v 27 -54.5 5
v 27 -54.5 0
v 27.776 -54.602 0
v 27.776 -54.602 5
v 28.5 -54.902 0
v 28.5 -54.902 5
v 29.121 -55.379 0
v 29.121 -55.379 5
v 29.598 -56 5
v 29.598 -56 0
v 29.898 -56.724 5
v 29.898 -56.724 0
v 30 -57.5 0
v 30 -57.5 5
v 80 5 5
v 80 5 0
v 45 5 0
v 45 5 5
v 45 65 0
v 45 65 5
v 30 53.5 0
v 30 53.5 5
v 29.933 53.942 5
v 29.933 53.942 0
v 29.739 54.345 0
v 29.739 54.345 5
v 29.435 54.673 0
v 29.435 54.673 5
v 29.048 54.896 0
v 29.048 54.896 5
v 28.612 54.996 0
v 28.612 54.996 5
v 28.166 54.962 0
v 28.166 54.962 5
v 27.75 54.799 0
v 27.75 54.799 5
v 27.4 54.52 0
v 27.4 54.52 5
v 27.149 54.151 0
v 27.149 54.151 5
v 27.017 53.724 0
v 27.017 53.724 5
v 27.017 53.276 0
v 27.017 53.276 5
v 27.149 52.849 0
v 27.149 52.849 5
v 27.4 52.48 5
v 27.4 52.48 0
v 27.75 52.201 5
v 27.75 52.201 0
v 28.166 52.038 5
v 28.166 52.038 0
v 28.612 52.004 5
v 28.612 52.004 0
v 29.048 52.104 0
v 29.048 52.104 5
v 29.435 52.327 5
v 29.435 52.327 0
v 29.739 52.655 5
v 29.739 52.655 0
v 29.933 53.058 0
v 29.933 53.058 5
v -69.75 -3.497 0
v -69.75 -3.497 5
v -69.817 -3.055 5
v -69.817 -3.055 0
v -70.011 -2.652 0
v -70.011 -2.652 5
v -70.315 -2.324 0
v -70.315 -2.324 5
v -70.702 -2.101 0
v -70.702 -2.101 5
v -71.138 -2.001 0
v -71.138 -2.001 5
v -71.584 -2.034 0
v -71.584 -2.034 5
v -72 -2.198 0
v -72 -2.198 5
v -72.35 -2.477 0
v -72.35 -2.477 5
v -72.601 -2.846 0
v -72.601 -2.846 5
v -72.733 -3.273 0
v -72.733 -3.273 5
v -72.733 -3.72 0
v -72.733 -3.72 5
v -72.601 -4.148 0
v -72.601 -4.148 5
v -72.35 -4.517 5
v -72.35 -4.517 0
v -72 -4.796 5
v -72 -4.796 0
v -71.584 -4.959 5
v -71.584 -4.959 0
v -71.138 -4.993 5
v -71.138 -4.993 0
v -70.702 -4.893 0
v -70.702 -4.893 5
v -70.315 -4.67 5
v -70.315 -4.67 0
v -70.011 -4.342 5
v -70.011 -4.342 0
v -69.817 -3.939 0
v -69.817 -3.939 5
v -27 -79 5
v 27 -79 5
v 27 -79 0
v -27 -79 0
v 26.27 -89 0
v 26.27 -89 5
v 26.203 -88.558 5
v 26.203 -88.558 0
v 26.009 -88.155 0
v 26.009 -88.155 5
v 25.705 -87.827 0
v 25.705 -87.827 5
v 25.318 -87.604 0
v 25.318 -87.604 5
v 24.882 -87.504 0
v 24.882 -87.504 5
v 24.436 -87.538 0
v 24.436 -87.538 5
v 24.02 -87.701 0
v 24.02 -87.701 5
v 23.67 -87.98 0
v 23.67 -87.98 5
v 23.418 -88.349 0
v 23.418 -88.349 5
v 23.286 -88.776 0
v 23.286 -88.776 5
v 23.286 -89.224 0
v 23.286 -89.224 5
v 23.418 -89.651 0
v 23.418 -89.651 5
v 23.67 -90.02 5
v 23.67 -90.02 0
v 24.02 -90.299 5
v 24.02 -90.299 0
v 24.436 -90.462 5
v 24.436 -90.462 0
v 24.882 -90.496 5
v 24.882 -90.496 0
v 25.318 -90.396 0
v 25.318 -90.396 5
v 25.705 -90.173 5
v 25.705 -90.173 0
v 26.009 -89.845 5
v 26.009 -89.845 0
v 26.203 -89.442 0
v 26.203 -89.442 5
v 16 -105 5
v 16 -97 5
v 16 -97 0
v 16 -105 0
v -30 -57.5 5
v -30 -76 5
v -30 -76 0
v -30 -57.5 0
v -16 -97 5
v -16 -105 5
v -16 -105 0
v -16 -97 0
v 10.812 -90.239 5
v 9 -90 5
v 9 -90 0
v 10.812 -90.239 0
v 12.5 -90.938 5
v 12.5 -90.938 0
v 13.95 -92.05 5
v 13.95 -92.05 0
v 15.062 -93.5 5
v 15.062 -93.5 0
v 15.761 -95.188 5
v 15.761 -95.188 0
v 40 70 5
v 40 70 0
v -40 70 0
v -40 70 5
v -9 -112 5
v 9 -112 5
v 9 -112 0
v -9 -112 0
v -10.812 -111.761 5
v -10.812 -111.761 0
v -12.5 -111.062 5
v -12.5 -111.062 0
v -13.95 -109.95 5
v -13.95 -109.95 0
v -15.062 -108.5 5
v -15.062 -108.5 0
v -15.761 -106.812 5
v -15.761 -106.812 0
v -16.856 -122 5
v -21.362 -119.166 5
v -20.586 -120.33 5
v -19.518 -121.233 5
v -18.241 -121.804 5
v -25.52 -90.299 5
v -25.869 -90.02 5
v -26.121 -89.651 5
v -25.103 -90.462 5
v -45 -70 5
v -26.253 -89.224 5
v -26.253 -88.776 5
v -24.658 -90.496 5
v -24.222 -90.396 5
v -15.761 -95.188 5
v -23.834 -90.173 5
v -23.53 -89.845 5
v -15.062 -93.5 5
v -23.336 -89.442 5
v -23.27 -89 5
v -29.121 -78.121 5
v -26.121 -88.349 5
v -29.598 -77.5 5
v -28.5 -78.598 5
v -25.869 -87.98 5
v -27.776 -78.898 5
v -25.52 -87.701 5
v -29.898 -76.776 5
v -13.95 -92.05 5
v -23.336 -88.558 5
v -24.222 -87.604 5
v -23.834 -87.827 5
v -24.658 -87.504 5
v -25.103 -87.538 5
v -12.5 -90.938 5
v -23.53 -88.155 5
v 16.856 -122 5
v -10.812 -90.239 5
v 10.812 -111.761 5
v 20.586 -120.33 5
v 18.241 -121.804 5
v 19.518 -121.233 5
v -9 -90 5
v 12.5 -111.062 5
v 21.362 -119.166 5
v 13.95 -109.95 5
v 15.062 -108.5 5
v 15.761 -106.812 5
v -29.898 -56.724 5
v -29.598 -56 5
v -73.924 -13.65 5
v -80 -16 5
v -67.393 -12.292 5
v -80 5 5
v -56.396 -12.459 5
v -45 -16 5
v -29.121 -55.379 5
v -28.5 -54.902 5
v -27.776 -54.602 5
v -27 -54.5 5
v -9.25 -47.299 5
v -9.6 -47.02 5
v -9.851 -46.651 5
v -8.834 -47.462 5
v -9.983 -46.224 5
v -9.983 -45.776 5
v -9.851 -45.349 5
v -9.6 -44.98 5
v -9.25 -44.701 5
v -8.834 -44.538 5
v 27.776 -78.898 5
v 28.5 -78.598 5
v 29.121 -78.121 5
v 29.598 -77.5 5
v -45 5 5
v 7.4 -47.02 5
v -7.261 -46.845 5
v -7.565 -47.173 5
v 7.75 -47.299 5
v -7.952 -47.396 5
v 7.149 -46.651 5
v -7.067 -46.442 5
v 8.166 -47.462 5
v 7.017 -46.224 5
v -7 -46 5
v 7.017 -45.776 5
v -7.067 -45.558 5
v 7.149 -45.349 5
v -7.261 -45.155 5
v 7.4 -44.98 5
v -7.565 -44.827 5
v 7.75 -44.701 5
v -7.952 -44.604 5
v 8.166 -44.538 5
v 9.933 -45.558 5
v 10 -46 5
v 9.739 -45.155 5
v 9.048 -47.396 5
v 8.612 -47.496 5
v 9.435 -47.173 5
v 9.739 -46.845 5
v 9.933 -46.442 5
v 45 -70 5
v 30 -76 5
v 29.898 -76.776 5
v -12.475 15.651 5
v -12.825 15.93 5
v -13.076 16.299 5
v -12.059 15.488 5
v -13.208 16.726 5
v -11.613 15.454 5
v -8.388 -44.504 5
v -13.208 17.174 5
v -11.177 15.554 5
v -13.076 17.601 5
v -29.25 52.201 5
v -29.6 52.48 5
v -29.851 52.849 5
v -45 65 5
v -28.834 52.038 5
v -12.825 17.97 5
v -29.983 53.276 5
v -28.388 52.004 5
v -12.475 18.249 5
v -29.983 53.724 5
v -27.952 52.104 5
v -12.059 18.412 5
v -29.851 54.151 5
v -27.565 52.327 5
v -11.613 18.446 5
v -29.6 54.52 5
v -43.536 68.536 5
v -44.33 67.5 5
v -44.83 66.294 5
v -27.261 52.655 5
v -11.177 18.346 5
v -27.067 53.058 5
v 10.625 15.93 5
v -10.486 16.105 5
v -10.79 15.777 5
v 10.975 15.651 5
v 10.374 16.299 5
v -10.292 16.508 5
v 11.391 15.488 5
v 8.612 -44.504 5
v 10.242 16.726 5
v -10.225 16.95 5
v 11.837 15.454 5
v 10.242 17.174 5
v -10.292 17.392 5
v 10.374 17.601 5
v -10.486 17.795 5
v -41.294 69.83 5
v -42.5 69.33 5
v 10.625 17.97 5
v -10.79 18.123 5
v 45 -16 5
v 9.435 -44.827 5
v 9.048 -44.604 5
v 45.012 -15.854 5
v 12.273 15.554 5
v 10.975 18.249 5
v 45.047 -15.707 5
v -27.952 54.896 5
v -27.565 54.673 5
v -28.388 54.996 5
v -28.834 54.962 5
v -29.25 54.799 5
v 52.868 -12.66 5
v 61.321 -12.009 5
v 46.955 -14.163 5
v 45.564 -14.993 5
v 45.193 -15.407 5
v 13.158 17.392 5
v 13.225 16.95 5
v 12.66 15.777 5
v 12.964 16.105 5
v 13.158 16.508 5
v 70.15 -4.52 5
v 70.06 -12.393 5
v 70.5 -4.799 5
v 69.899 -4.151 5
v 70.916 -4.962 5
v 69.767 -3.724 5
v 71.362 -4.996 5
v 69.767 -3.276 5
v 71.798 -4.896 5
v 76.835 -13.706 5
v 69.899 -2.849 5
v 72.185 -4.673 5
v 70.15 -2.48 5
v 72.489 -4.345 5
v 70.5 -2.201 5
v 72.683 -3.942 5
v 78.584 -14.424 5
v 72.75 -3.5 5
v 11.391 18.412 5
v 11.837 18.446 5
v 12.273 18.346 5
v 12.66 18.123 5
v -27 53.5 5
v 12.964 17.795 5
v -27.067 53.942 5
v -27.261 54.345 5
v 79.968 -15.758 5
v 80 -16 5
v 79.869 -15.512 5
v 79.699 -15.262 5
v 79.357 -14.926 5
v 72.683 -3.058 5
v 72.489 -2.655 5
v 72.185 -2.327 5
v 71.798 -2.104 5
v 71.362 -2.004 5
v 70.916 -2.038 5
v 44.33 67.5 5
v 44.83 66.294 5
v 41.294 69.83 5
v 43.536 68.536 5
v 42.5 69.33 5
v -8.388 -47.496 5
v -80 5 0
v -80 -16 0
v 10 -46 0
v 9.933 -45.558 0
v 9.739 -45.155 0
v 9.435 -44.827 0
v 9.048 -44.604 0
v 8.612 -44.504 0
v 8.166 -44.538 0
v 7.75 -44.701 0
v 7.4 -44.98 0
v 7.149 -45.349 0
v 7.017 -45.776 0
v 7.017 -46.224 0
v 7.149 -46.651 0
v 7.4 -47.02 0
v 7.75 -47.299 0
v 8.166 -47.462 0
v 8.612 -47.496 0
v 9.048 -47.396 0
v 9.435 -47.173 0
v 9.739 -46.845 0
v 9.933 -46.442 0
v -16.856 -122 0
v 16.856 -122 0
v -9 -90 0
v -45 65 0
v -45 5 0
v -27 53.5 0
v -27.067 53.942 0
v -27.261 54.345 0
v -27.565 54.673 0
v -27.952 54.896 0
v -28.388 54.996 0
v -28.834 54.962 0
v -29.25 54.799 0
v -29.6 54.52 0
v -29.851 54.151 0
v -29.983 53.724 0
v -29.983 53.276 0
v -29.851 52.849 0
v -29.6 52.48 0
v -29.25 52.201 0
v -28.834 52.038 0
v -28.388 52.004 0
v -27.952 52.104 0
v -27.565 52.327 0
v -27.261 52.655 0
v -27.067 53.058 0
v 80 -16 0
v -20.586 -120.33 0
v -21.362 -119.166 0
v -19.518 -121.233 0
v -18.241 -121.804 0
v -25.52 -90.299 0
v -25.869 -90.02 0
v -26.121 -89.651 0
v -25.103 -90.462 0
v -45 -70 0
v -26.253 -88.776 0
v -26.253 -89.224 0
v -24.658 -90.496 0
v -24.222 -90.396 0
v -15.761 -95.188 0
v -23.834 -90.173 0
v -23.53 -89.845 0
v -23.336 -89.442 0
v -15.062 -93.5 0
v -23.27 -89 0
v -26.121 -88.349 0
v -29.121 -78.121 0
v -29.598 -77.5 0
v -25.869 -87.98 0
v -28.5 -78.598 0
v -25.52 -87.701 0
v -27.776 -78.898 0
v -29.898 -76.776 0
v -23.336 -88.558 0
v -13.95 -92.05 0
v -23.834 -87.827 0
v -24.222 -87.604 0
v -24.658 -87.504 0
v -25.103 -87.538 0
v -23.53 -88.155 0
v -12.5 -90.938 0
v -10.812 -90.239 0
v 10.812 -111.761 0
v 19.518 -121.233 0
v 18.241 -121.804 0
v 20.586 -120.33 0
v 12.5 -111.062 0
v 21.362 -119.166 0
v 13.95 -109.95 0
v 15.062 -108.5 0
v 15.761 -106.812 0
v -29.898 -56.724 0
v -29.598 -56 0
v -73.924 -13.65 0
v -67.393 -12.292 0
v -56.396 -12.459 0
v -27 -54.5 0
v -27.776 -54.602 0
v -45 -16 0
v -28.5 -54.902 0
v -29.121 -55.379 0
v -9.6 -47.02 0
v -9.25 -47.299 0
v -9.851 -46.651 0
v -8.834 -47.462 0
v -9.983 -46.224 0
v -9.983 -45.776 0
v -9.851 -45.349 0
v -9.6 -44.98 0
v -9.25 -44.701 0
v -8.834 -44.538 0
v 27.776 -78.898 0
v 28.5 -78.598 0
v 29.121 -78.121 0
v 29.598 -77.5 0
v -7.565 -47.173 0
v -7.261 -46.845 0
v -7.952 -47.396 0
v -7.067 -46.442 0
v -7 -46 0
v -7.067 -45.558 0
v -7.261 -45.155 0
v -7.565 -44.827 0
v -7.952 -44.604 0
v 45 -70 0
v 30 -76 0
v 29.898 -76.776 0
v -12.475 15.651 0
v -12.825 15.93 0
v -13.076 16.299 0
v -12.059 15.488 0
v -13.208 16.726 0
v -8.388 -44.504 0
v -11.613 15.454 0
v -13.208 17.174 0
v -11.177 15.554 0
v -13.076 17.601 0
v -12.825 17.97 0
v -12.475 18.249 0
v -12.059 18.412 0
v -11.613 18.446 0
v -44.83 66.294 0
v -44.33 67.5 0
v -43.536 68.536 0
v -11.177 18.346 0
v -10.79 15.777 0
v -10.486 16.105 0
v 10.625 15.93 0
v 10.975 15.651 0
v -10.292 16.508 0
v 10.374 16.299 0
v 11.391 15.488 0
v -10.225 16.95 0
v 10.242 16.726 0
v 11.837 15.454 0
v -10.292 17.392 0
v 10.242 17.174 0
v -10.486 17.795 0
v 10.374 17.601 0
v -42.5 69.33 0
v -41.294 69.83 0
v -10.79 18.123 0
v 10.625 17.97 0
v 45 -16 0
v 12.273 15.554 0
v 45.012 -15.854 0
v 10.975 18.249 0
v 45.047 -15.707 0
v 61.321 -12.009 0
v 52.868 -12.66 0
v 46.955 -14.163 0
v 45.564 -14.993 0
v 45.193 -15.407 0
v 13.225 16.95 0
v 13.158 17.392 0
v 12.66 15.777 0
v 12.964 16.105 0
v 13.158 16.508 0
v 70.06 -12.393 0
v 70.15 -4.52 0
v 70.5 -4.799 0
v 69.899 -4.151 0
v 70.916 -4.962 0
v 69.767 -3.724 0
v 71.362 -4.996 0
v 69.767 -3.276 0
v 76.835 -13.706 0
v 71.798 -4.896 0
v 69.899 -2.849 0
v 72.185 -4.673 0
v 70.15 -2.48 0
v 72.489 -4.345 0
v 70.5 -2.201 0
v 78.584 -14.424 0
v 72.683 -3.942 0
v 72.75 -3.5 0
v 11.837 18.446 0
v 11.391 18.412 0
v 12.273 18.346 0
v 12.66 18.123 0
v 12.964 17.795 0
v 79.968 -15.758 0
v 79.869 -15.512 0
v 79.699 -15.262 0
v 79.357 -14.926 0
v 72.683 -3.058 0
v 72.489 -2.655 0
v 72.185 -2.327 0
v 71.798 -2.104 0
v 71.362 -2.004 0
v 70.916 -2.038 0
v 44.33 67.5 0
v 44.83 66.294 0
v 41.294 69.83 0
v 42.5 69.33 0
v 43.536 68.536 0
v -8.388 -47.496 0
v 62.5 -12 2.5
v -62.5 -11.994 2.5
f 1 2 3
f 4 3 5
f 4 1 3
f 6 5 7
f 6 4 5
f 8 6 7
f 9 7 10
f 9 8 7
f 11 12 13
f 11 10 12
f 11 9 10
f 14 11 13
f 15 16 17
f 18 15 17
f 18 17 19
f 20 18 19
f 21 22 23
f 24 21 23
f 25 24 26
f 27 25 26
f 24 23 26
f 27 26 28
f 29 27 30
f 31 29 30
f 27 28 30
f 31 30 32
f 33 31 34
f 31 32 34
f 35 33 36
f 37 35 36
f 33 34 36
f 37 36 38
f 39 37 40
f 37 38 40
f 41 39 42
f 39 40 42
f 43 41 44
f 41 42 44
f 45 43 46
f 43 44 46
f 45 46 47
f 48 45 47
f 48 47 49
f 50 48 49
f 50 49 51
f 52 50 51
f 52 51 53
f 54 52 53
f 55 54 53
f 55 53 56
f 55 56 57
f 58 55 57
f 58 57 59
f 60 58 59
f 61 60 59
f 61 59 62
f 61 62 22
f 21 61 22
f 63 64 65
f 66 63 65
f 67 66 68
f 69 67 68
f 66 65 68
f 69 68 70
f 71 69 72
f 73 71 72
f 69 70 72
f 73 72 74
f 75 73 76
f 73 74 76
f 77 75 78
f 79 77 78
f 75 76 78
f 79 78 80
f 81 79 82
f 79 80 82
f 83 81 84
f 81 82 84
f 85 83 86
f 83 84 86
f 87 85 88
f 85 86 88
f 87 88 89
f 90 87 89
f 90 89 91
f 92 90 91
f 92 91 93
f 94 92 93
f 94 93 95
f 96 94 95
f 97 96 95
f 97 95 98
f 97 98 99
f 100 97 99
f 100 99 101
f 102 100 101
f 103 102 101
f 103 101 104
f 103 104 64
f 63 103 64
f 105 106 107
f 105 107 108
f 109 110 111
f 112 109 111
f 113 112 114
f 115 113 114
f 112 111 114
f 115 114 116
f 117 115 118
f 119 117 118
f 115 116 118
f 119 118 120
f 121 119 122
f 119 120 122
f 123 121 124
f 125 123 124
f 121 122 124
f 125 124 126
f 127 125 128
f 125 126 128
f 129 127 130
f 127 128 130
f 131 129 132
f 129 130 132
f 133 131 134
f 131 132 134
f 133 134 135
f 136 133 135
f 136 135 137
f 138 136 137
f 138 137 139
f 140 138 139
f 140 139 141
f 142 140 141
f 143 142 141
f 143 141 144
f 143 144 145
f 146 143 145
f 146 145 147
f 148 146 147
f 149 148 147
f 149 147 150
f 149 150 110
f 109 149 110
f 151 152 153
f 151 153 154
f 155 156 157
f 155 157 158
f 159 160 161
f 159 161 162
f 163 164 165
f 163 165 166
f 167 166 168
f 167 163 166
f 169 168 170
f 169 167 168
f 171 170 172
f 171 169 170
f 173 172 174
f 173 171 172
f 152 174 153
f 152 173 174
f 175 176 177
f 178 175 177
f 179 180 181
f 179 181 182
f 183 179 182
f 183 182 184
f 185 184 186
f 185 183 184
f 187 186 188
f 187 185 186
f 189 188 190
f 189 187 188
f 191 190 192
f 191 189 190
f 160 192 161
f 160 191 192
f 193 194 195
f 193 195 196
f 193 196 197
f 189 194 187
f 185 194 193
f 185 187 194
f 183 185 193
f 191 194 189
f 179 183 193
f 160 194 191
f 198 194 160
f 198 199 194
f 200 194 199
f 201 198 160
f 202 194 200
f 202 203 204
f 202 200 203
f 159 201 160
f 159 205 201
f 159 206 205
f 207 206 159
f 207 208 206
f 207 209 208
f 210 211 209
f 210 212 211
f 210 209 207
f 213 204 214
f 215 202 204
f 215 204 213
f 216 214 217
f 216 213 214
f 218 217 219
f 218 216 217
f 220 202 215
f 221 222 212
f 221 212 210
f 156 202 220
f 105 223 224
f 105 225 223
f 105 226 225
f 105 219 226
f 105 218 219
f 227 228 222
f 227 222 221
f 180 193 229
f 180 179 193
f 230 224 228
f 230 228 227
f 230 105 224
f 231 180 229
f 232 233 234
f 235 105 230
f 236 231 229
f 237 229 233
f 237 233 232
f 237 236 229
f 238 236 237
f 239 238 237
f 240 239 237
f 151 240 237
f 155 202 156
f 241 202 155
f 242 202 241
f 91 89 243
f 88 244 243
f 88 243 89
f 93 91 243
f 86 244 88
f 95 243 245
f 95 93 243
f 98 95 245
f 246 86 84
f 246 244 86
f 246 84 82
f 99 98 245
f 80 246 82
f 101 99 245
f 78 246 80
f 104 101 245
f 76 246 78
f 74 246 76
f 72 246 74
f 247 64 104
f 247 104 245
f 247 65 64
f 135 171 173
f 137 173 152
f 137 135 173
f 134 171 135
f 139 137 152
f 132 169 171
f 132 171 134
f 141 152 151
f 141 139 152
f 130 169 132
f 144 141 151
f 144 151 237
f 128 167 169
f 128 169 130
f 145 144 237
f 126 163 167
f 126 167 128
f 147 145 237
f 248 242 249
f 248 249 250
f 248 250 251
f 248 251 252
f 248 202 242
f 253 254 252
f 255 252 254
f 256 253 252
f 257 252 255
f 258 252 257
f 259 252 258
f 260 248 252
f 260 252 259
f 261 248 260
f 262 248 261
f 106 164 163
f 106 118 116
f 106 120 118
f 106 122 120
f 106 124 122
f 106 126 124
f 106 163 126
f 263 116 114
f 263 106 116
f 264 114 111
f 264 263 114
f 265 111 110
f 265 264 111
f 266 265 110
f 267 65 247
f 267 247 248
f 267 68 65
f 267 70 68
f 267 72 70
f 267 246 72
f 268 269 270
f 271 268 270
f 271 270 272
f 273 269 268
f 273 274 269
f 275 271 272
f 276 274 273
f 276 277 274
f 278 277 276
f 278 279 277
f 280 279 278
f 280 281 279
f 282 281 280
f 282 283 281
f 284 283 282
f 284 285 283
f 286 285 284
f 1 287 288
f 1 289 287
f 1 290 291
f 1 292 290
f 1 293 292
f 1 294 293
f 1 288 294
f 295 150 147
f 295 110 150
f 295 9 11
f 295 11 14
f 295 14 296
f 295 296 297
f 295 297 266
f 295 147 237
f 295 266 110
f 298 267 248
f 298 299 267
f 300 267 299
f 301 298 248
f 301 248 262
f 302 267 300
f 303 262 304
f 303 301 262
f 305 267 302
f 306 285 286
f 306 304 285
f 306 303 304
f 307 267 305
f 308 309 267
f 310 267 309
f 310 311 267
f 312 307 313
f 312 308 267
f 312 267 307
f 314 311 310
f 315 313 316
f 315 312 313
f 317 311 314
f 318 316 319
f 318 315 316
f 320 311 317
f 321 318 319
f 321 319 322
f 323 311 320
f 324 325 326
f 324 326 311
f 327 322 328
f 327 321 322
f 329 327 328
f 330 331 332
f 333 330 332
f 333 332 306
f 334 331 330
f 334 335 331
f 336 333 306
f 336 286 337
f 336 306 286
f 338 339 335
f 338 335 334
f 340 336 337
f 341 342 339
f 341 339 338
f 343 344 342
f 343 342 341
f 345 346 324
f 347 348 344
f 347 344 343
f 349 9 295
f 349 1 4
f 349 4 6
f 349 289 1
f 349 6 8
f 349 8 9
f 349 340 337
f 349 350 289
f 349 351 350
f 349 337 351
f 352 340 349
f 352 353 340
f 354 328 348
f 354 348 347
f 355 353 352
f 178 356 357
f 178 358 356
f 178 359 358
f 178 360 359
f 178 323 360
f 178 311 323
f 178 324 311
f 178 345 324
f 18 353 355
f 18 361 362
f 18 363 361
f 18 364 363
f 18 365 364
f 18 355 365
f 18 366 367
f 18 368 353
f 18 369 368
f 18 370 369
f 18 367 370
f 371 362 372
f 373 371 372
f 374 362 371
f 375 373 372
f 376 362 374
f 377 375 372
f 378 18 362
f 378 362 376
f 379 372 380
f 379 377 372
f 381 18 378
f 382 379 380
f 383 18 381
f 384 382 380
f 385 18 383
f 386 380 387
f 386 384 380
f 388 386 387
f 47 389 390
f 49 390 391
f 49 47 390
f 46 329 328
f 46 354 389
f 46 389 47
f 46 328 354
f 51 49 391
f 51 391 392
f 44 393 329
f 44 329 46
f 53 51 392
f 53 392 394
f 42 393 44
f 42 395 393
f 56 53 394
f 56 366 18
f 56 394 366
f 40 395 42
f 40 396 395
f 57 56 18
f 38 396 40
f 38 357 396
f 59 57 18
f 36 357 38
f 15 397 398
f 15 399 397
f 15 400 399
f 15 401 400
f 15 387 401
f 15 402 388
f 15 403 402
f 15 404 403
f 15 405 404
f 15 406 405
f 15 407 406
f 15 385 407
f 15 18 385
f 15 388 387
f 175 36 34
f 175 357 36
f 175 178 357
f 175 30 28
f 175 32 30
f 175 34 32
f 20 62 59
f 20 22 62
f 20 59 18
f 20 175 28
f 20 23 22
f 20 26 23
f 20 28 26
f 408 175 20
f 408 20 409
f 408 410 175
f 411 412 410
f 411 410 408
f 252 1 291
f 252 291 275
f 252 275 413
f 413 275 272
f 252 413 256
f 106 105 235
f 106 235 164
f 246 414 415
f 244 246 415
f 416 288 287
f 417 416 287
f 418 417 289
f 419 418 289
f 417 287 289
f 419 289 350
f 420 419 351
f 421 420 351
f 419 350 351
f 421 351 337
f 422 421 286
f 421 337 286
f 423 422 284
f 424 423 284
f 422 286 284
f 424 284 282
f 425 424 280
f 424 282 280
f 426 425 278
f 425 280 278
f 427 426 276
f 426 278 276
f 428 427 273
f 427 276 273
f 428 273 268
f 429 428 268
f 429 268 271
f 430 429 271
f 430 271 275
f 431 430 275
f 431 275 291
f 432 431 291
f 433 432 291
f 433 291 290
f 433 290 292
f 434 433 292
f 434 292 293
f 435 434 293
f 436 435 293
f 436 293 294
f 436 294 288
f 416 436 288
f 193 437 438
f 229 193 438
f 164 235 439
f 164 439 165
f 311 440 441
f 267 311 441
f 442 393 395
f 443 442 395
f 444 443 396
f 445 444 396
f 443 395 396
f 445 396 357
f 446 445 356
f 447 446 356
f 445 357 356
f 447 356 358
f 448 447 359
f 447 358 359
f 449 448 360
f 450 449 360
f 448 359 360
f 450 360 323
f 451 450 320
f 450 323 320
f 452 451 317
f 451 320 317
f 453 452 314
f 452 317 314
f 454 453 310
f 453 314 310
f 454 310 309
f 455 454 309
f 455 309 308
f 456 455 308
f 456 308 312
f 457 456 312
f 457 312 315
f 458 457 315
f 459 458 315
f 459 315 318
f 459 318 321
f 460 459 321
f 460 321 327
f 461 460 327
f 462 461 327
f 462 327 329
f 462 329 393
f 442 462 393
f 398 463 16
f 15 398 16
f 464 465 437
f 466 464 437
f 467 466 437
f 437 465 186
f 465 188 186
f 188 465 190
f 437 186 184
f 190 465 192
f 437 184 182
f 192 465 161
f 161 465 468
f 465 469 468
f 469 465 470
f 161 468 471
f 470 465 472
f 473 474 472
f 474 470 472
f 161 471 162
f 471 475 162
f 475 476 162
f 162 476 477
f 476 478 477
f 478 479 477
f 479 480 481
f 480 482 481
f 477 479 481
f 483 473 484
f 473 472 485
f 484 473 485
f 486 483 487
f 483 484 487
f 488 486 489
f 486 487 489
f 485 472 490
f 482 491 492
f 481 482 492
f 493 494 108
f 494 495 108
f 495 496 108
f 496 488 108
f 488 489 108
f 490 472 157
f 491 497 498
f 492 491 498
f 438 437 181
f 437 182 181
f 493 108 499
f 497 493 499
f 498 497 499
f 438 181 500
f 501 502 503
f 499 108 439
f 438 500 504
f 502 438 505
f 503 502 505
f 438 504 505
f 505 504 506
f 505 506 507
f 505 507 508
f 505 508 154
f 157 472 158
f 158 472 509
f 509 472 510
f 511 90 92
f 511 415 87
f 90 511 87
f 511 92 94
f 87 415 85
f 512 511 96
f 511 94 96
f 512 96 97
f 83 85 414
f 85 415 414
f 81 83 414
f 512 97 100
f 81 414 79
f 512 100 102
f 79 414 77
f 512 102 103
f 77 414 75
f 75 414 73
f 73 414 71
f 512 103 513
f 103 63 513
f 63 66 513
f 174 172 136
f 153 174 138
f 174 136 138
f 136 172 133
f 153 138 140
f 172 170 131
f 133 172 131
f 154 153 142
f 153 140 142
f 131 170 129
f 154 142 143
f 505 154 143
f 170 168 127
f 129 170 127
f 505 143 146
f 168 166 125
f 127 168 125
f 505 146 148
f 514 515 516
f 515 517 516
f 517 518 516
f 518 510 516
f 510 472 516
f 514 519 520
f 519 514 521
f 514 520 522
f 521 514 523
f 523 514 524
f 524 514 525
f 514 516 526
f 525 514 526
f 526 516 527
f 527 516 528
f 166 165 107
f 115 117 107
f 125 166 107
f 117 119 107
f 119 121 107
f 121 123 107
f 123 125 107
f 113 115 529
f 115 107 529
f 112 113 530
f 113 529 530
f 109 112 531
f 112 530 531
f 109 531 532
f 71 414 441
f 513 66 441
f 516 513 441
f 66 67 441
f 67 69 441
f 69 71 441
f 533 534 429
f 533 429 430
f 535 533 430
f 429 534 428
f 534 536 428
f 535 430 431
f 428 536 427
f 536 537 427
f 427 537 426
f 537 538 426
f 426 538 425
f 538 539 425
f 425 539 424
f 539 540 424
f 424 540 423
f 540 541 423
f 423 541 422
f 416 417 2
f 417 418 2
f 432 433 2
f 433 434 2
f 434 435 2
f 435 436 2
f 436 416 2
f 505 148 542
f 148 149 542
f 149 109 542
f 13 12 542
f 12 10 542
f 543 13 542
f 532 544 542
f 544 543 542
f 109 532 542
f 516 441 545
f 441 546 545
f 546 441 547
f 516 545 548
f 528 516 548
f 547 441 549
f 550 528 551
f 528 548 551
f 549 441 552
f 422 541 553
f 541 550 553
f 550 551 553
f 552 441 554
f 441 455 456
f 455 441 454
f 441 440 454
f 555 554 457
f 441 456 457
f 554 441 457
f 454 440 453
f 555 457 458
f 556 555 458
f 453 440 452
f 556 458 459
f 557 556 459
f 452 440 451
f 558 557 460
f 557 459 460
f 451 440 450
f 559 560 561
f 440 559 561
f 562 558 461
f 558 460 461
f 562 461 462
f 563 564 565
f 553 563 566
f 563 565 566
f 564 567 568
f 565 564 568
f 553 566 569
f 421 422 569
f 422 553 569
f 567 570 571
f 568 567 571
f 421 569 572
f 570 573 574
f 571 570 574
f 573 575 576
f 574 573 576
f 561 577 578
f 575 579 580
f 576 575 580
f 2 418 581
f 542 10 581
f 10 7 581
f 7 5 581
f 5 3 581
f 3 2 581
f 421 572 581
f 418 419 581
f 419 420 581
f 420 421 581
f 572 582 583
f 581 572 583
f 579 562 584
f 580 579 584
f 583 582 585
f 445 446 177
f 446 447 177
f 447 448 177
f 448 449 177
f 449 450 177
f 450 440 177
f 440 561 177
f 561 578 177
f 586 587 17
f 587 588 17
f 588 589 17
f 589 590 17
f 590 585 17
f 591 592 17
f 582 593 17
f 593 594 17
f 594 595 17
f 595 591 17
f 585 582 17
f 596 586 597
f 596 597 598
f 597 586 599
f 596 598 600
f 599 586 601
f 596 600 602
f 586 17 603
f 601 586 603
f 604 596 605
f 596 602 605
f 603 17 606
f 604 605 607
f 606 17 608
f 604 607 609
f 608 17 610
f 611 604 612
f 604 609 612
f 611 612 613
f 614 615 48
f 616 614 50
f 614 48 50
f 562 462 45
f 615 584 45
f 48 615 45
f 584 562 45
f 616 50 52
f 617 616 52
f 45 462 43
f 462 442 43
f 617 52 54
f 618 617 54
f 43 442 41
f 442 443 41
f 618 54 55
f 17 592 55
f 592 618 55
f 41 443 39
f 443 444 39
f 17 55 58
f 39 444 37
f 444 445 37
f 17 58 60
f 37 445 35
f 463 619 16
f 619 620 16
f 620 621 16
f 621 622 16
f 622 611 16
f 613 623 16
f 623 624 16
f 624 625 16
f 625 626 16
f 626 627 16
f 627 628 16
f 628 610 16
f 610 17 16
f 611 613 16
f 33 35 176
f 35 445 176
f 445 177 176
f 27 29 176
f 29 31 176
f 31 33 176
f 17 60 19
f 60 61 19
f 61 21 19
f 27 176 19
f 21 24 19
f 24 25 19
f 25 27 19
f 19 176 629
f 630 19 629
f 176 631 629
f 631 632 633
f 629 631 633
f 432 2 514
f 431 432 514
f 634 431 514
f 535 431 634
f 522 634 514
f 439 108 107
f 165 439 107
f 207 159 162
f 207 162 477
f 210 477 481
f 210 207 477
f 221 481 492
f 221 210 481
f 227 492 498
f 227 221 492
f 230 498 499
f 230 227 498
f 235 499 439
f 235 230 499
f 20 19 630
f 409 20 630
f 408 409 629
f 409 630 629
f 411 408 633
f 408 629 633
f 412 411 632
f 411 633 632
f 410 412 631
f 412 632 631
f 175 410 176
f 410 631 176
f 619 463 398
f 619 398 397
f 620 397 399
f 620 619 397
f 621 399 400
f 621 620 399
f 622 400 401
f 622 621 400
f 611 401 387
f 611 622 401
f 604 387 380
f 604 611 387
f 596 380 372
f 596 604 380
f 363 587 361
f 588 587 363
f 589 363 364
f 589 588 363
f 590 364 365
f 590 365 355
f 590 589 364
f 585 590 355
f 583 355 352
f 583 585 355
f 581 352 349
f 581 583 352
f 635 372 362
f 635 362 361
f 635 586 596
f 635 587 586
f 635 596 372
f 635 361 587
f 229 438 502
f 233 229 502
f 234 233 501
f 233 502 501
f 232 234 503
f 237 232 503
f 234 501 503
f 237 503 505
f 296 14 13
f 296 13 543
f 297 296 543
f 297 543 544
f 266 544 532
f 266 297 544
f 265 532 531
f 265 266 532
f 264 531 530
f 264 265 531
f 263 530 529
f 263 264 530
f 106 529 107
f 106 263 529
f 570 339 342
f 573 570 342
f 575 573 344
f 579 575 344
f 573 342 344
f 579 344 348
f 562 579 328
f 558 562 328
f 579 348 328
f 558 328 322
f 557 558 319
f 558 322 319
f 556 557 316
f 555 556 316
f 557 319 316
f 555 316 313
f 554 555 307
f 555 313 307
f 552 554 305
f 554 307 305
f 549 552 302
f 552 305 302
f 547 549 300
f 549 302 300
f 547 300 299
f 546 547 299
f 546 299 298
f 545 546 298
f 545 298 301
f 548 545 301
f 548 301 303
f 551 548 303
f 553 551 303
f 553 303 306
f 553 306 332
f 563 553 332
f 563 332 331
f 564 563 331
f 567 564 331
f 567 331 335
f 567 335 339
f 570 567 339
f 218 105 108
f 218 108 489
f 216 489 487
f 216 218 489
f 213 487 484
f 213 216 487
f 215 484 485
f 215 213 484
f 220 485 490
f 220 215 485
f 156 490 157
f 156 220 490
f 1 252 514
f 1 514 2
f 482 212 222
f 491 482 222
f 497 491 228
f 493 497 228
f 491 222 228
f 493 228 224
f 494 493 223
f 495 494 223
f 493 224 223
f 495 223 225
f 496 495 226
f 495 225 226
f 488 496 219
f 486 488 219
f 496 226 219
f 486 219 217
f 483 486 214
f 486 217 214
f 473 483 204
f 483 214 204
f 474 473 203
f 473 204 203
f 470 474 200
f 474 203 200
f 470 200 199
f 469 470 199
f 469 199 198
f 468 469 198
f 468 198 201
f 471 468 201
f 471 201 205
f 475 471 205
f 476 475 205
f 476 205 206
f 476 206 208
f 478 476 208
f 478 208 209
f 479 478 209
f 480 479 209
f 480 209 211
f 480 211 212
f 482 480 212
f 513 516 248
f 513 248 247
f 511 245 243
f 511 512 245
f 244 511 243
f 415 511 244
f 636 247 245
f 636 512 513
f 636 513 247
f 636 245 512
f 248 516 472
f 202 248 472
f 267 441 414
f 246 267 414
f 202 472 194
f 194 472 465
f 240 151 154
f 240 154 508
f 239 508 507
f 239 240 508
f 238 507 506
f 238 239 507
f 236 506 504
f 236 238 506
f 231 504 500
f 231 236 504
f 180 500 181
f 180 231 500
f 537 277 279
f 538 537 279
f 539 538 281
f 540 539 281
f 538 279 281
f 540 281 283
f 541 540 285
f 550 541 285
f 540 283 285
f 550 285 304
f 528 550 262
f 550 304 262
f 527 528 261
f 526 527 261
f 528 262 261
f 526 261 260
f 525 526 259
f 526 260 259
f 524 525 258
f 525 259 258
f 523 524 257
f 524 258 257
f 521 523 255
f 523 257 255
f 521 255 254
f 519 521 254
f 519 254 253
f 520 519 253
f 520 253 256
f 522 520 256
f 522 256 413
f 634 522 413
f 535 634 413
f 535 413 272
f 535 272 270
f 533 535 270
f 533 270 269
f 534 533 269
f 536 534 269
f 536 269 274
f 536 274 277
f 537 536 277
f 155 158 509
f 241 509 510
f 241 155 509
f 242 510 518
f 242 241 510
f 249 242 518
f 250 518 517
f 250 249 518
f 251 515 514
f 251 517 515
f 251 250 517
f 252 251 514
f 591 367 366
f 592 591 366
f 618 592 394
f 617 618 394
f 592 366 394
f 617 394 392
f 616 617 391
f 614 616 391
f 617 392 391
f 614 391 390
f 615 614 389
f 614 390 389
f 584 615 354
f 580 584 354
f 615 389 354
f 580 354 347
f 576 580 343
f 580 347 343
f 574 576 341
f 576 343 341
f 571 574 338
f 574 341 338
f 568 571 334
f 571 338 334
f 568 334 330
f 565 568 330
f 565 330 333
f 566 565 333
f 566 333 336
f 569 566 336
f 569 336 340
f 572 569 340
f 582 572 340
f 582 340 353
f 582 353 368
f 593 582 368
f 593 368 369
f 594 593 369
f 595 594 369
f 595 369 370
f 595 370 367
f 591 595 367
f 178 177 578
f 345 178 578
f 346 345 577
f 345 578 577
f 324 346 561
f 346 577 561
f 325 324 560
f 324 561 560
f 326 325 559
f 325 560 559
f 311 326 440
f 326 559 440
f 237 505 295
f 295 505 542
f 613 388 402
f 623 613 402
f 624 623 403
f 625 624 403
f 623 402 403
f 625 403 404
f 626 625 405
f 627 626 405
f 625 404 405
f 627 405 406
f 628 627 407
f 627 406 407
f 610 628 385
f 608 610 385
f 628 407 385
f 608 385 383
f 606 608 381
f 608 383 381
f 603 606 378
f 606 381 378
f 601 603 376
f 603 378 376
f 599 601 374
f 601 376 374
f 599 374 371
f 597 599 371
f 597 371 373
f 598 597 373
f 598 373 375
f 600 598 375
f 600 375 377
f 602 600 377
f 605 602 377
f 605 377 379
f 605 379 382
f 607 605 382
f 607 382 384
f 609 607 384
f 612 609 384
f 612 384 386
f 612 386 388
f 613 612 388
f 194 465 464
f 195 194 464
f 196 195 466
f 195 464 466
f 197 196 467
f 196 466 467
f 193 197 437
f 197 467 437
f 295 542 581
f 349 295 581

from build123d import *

# Parameters (mm, degrees)
BOSS_EXTRUDE1_DEPTH = 5
SKETCH3_R           = 1.5
CUT_EXTRUDE1_DEPTH  = 146.976025571
CUT_EXTRUDE2_DEPTH  = 146.976025571
SKETCH5_R           = 1.5
CUT_EXTRUDE3_DEPTH  = 146.976025571
CUT_EXTRUDE4_DEPTH  = 146.976025571
SKETCH7_R           = 1.5
CUT_EXTRUDE5_DEPTH  = 146.976025571


with BuildPart() as part:
    # Sketch2 → Boss-Extrude1 (new body)
    with BuildSketch(Plane.XY):
        with BuildLine():
            Line((-45, -70), (-21.362272993, -119.166472174))
            ThreePointArc((-21.362272993, -119.166472174), (-19.517555453, -121.23275093), (-16.85601087, -122))
            Line((-16.85601087, -122), (16.85601087, -122))
            ThreePointArc((16.85601087, -122), (19.517555453, -121.23275093), (21.362272993, -119.166472174))
            Line((21.362272993, -119.166472174), (45, -70))
            Line((45, -70), (45, -16))
            add(Edge.make_bspline(
                [(80, -16), (80, -12), (62.5, -12), (45, -12), (45, -16)],
                knots=[3.141592654, 3.141592654, 3.141592654, 4.71238898, 4.71238898, 6.283185307, 6.283185307, 6.283185307], degree=2, weights=[1, 0.707106781, 1, 0.707106781, 1]))
            Line((80, -16), (80, 5))
            Line((80, 5), (45, 5))
            Line((45, 5), (45, 65))
            ThreePointArc((45, 65), (43.535533906, 68.535533906), (40, 70))
            Line((40, 70), (-40, 70))
            ThreePointArc((-40, 70), (-43.535533906, 68.535533906), (-45, 65))
            Line((-45, 65), (-45, 5))
            Line((-45, 5), (-80, 5))
            Line((-80, 5), (-80, -16))
            add(Edge.make_bspline(
                [(-45, -16), (-62.5, -7.544335015), (-80, -16)],
                knots=[3.141592654, 3.141592654, 3.141592654, 4.041796627, 4.041796627, 4.041796627], degree=2, weights=[1, 0.900402737, 1]))
            Line((-45, -16), (-45, -70))
        make_face()
    extrude(amount=BOSS_EXTRUDE1_DEPTH)

    # Sketch3 → Cut-Extrude1 (cut, through all)
    with BuildSketch(Plane.XY.offset(5)):
        with Locations((-71.25, -3.49687094)):
            Circle(SKETCH3_R)
        with Locations((71.25, -3.5)):
            Circle(SKETCH3_R)
    extrude(amount=-CUT_EXTRUDE1_DEPTH, mode=Mode.SUBTRACT)

    # Sketch4 → Cut-Extrude2 (cut, through all)
    with BuildSketch(Plane.XY.offset(5)):
        with BuildLine():
            Line((-9, -90), (9, -90))
            ThreePointArc((9, -90), (13.949747468, -92.050252532), (16, -97))
            Line((16, -97), (16, -105))
            ThreePointArc((16, -105), (13.949747468, -109.949747468), (9, -112))
            Line((9, -112), (-9, -112))
            ThreePointArc((-9, -112), (-13.949747468, -109.949747468), (-16, -105))
            Line((-16, -105), (-16, -97))
            ThreePointArc((-16, -97), (-13.949747468, -92.050252532), (-9, -90))
        make_face()
    extrude(amount=-CUT_EXTRUDE2_DEPTH, mode=Mode.SUBTRACT)

    # Sketch5 → Cut-Extrude3 (cut, through all)
    with BuildSketch(Plane.XY.offset(5)):
        with Locations((11.725, 16.949973779)):
            Circle(SKETCH5_R)
        with Locations((-11.725, 16.949973779)):
            Circle(SKETCH5_R)
    extrude(amount=-CUT_EXTRUDE3_DEPTH, mode=Mode.SUBTRACT)

    # Sketch6 → Cut-Extrude4 (cut, through all)
    with BuildSketch(Plane.XY.offset(5)):
        with BuildLine():
            Line((-27, -54.5), (27, -54.5))
            ThreePointArc((27, -54.5), (29.121320344, -55.378679656), (30, -57.5))
            Line((30, -57.5), (30, -76))
            ThreePointArc((30, -76), (29.121320344, -78.121320344), (27, -79))
            Line((27, -79), (-27, -79))
            ThreePointArc((-27, -79), (-29.121320344, -78.121320344), (-30, -76))
            Line((-30, -76), (-30, -57.5))
            ThreePointArc((-30, -57.5), (-29.121320344, -55.378679656), (-27, -54.5))
        make_face()
    extrude(amount=-CUT_EXTRUDE4_DEPTH, mode=Mode.SUBTRACT)

    # Sketch7 → Cut-Extrude5 (cut, through all)
    with BuildSketch(Plane.XY.offset(5)):
        with Locations((-28.5, 53.5)):
            Circle(SKETCH7_R)
        with Locations((28.5, 53.5)):
            Circle(SKETCH7_R)
        with Locations((-24.769714049, -89)):
            Circle(SKETCH7_R)
        with Locations((24.769714049, -89)):
            Circle(SKETCH7_R)
        with Locations((-8.5, -46)):
            Circle(SKETCH7_R)
        with Locations((8.5, -46)):
            Circle(SKETCH7_R)
    extrude(amount=-CUT_EXTRUDE5_DEPTH, mode=Mode.SUBTRACT)


solid = part.part
